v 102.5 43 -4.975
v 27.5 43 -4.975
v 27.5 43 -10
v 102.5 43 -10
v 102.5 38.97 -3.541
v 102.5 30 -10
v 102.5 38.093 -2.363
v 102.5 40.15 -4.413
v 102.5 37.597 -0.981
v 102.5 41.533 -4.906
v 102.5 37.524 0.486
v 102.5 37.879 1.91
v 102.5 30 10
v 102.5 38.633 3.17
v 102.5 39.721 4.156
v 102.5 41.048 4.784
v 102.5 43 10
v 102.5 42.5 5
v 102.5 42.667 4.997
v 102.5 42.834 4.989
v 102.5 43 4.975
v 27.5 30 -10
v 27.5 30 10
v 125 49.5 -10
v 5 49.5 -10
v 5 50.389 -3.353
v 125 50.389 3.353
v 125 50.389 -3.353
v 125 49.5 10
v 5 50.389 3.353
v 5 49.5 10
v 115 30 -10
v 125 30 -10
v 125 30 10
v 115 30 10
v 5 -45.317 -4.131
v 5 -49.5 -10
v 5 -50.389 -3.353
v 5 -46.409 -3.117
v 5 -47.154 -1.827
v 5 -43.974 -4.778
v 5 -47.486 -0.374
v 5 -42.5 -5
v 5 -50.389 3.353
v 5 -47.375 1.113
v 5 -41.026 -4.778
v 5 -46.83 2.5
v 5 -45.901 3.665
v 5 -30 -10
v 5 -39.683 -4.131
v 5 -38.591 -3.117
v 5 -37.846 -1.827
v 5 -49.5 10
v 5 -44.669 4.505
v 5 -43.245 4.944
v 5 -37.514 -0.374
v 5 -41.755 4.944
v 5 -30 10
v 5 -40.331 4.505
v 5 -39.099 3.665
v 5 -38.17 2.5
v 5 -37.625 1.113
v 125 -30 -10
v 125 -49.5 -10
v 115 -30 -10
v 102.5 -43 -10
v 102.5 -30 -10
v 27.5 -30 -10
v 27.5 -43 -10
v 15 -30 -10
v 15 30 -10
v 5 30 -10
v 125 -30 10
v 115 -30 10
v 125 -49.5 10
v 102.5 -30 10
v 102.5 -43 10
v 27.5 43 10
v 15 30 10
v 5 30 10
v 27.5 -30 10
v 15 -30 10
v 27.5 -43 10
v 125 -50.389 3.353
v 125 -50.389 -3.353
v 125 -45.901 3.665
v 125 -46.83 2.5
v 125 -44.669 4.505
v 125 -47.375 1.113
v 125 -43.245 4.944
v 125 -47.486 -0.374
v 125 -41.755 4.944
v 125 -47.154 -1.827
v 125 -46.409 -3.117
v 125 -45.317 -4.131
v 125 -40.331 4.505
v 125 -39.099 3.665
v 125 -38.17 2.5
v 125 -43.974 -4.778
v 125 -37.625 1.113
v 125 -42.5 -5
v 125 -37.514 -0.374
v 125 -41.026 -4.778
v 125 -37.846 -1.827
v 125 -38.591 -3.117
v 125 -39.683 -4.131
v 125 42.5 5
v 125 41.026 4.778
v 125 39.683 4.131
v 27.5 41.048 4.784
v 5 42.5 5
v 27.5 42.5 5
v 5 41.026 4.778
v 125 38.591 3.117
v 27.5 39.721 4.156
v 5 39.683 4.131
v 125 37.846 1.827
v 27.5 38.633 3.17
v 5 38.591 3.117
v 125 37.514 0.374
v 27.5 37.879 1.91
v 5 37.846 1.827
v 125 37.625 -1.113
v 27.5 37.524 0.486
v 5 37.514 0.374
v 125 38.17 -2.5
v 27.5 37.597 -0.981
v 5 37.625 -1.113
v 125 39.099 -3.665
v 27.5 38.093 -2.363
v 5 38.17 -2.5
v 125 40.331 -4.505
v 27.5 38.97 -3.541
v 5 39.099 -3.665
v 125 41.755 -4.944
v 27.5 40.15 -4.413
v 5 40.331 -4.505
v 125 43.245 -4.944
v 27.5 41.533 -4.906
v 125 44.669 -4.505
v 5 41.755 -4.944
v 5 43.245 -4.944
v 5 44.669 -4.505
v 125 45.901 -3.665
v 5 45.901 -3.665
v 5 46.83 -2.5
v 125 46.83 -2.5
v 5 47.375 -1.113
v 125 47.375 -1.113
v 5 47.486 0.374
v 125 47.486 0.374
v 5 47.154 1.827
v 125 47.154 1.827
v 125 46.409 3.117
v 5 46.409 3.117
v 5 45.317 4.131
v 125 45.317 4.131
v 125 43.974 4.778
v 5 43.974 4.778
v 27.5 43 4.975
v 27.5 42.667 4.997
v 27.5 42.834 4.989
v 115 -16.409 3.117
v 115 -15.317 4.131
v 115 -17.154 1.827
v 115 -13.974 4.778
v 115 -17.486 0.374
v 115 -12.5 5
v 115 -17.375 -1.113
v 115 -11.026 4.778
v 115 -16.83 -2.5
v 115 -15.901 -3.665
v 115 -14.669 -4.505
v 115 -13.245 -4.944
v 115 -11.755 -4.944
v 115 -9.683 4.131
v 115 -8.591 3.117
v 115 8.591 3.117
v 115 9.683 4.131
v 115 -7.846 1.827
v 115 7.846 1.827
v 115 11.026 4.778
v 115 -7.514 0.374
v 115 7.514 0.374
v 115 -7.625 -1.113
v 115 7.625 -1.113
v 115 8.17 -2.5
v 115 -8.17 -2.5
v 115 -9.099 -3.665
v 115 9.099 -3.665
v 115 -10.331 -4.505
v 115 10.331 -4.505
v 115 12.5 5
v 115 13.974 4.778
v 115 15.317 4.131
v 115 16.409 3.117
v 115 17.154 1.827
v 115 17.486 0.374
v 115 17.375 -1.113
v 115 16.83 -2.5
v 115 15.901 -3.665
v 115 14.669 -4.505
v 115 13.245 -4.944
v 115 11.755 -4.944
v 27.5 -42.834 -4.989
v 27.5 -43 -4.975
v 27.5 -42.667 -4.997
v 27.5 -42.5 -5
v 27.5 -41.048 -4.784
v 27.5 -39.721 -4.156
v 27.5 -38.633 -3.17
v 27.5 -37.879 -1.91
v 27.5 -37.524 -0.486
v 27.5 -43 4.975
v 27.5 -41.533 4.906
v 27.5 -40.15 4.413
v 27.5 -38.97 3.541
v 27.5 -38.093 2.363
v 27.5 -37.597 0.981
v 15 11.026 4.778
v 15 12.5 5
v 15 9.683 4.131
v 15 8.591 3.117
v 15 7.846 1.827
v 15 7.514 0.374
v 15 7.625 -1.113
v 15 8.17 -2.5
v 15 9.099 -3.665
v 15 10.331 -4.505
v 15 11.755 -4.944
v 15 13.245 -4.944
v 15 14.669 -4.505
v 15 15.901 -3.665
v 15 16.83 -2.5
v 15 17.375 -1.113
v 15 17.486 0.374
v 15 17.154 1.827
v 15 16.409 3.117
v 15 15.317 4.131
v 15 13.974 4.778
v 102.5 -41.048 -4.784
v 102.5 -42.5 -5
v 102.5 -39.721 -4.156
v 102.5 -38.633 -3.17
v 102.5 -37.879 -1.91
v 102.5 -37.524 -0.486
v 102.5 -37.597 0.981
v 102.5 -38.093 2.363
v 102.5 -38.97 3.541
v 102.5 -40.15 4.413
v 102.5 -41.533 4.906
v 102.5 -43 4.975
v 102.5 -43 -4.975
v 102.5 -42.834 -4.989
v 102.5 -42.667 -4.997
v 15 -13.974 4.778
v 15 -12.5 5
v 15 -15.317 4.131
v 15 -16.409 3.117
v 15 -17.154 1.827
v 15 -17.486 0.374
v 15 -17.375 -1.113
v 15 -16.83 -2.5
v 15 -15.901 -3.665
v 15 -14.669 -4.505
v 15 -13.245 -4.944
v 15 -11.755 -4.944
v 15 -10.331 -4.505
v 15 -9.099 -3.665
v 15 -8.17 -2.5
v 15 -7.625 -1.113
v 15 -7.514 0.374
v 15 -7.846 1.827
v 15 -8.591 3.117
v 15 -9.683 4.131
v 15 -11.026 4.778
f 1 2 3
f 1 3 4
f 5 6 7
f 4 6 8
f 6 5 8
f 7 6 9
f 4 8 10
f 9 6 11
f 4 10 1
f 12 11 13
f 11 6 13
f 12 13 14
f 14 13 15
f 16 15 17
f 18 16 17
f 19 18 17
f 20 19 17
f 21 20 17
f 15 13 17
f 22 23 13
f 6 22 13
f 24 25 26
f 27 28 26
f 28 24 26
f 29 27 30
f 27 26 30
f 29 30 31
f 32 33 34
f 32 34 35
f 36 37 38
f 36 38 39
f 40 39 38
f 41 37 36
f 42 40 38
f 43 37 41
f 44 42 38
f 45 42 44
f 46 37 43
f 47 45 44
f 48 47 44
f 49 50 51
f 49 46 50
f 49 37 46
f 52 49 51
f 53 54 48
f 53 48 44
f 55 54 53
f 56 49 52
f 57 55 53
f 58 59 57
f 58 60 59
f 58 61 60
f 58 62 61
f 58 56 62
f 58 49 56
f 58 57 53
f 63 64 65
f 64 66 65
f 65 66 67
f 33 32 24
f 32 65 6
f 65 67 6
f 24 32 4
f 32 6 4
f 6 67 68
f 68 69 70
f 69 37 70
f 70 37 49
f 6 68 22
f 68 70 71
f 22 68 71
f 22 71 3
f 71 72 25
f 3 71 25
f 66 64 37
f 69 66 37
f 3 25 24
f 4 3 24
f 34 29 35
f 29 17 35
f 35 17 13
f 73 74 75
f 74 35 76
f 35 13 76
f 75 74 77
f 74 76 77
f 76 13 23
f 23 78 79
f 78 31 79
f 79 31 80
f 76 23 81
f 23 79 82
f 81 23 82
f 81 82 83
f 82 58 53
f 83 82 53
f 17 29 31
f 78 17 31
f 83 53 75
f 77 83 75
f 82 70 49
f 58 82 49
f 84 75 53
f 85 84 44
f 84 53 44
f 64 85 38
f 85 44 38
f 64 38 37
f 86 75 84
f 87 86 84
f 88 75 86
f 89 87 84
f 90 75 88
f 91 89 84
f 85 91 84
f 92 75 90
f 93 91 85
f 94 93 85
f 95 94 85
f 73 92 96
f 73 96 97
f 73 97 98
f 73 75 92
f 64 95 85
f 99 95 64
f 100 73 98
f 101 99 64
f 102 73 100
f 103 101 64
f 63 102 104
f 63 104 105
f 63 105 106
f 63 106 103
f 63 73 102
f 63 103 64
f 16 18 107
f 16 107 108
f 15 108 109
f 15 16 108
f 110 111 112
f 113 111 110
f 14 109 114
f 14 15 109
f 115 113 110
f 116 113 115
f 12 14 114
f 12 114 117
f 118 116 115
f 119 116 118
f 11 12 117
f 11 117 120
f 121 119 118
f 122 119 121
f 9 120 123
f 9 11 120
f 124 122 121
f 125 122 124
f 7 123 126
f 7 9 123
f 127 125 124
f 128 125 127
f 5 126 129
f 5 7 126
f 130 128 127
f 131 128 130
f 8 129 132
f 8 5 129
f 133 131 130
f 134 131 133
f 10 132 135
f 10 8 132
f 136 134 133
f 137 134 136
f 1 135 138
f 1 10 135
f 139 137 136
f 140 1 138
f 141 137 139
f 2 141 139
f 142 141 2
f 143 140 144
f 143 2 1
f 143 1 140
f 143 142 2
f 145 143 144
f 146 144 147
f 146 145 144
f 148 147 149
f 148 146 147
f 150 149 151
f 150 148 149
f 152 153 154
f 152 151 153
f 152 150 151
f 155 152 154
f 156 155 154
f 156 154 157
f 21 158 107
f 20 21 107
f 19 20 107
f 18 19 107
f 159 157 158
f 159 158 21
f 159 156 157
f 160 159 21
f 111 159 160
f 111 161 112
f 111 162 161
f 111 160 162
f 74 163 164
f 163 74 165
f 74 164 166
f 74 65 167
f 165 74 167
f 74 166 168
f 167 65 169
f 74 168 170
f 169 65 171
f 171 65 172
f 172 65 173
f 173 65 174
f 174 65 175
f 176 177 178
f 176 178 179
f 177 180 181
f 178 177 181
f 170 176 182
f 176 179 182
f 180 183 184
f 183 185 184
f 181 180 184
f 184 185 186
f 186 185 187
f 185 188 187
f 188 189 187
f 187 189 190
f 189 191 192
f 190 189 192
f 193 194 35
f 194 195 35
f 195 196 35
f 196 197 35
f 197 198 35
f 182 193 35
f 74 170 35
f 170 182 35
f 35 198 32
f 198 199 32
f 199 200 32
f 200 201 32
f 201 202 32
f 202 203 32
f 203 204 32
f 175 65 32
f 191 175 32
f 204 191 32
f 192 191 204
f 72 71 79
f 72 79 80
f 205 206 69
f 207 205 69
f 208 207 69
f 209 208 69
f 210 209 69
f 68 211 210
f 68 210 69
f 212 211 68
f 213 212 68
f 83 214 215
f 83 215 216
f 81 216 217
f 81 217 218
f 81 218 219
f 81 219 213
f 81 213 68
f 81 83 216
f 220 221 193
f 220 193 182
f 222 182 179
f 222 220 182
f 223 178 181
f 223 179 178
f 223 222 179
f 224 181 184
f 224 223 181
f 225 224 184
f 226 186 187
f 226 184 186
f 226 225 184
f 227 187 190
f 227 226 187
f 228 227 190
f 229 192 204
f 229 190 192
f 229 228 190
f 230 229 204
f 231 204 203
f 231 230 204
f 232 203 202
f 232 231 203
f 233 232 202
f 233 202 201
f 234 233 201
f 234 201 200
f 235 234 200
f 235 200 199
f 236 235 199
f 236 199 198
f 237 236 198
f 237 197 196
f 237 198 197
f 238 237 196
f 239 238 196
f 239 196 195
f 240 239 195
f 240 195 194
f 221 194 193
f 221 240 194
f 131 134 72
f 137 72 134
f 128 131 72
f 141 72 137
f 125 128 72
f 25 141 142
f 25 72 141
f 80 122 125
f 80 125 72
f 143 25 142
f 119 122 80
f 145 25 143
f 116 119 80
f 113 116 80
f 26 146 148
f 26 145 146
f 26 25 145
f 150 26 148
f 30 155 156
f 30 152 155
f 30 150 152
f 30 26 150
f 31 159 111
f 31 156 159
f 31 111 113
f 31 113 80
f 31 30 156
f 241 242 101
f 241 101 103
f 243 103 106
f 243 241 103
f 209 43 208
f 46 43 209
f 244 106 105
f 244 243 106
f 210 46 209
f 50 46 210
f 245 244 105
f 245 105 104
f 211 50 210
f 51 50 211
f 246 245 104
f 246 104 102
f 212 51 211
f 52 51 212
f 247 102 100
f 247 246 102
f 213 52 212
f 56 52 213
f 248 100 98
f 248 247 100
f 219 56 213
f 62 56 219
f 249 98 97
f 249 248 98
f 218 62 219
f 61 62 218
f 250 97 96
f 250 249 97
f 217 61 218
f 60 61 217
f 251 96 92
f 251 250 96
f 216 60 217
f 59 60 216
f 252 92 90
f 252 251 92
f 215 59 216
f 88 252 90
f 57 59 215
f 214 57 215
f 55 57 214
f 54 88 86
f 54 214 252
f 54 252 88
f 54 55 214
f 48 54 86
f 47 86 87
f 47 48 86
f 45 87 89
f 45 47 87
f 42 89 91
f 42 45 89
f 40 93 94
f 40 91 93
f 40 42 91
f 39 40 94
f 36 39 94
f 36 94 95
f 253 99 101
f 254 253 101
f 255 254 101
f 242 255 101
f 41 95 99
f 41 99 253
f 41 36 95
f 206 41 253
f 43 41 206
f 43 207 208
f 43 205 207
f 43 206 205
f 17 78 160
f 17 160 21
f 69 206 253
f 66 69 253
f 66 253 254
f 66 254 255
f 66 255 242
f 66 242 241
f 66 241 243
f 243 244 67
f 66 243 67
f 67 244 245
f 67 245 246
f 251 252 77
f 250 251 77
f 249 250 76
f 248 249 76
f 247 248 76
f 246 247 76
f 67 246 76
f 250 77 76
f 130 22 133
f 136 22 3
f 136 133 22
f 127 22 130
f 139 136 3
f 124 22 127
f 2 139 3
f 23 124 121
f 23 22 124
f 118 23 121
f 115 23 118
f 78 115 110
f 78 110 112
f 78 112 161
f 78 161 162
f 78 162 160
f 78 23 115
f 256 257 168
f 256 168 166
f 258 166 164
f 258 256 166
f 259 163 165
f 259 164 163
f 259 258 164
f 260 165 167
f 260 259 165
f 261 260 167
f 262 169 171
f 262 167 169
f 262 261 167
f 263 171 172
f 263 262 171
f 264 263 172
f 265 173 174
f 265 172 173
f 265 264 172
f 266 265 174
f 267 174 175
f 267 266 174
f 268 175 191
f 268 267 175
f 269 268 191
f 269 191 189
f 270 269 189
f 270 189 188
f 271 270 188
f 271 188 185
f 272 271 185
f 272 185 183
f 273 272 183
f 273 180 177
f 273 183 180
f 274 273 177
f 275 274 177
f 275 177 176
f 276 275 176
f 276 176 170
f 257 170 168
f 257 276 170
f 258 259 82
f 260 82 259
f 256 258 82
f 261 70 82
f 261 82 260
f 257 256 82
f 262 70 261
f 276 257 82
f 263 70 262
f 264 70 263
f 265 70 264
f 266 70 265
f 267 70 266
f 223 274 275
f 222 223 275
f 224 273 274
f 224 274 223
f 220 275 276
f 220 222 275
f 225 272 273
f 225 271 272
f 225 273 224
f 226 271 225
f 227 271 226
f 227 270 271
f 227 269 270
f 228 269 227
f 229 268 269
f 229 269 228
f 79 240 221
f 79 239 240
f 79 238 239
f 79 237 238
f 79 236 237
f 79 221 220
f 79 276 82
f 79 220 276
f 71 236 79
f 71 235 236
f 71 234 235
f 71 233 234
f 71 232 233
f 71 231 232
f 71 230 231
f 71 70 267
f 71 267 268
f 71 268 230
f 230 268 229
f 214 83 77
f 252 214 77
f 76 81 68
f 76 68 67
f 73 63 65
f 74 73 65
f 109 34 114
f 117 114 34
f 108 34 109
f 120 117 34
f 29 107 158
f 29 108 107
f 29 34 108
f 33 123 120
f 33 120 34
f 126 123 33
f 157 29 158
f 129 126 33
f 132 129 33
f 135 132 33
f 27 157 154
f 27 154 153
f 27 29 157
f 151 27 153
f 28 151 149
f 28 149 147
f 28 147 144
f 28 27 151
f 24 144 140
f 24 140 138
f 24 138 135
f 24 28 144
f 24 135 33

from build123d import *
from OCP.BRepFilletAPI import BRepFilletAPI_MakeChamfer

# Parameters (mm, degrees)
BOSS_EXTRUDE1_DEPTH = 125
SKETCH2_R           = 50.5
BOSS_EXTRUDE2_DEPTH = 5
SKETCH3_W           = 10
SKETCH3_H           = 60
CUT_EXTRUDE1_DEPTH  = 148.76839987
SKETCH7_W           = 62
SKETCH7_H           = 52
CUT_EXTRUDE3_DEPTH  = 5
SKETCH8_R           = 50.5
SKETCH8_W           = 62
SKETCH8_H           = 69
BOSS_EXTRUDE4_DEPTH = 140
CUT_EXTRUDE14_REACH = 159.164
SKETCH22_W          = 10
SKETCH22_H          = 25
BOSS_EXTRUDE5_DEPTH = 125
SKETCH11_W          = 140
SKETCH11_H          = 60
CUT_EXTRUDE5_DEPTH  = 397.485182573
CHAMFER2_SIZE       = 5
CHAMFER2_SIZE2      = 1.819851171
SKETCH9_R           = 5
CUT_EXTRUDE4_DEPTH  = 397.485182573
CUT_EXTRUDE6_REACH  = 399.883
SKETCH12_W          = 10
SKETCH12_H          = 60
SKETCH14_R          = 5
CUT_EXTRUDE8_DEPTH  = 397.485182573
SKETCH15_W          = 75
SKETCH15_H          = 13
CUT_EXTRUDE9_DEPTH  = 398.88252035
SKETCH17_R          = 50.5
SKETCH17_R_2        = 5
BOSS_EXTRUDE6_DEPTH = 5
CUT_EXTRUDE11_REACH = 403.404
SKETCH18_W          = 48
SKETCH18_H          = 35
SKETCH19_W          = 20
SKETCH19_H          = 20
BOSS_EXTRUDE7_DEPTH = 26
SKETCH20_W          = 23.5
SKETCH20_H          = 12.5
CUT_EXTRUDE12_DEPTH = 16
CHAMFER1_SIZE       = 4
SKETCH24_R          = 6
CUT_EXTRUDE16_DEPTH = 5
CUT_EXTRUDE13_REACH = 402.912
SKETCH21_W          = 7
SKETCH21_H          = 7
CUT_EXTRUDE15_REACH = 432.687
SKETCH23_W          = 1.5
SKETCH23_H          = 5
SKETCH16_W          = 221.910412248
SKETCH16_H          = 202.335986628
CUT_EXTRUDE10_DEPTH = 296
SKETCH25_W          = 135.205067632
SKETCH25_H          = 113.328081158
CUT_EXTRUDE17_DEPTH = 5


with BuildPart() as part:
    # Sketch1 → Boss-Extrude1 (new body)
    with BuildSketch(Plane(origin=(0, 0, 0), x_dir=(0, 0, -1), z_dir=(1, 0, 0))):
        with BuildLine():
            Line((-10, 49.5), (-10, -49.5))
            ThreePointArc((-10, -49.5), (0, -50.5), (10, -49.5))
            Line((10, -49.5), (10, 49.5))
            ThreePointArc((10, 49.5), (0, 50.5), (-10, 49.5))
        make_face()
    extrude(amount=BOSS_EXTRUDE1_DEPTH)

    # Sketch2 → Boss-Extrude2 (add)
    with BuildSketch(Plane(origin=(0, 0, 0), x_dir=(0, 0, -1), z_dir=(1, 0, 0))):
        with Locations(Location((0, 0, 0), (0, 0, 101.421186275))):
            Circle(SKETCH2_R)
    extrude(amount=BOSS_EXTRUDE2_DEPTH)

    # Sketch3 → Cut-Extrude1 (cut, through all)
    with BuildSketch(Plane(origin=(0, 0, -10), x_dir=(-1, 0, 0), z_dir=(0, 0, -1))):
        with Locations((-10, 0)):
            Rectangle(SKETCH3_W, SKETCH3_H)
        with Locations((-120, 0)):
            Rectangle(SKETCH3_W, SKETCH3_H)
    extrude(amount=-CUT_EXTRUDE1_DEPTH, mode=Mode.SUBTRACT)

    # Sketch7 → Cut-Extrude3 (cut)
    with BuildSketch(Plane.ZY):
        Rectangle(SKETCH7_W, SKETCH7_H)
    extrude(amount=-CUT_EXTRUDE3_DEPTH, mode=Mode.SUBTRACT)

    # Sketch8 → Boss-Extrude4 (add)
    with BuildSketch(Plane(origin=(125, 0, 0), x_dir=(0, 0, -1), z_dir=(1, 0, 0))):
        Circle(SKETCH8_R)
        with Locations((1.649655435, 0)):
            Rectangle(SKETCH8_W, SKETCH8_H, mode=Mode.SUBTRACT)
    extrude(amount=BOSS_EXTRUDE4_DEPTH)

    # Sketch22 → Cut-Extrude14 (cut, up to next)
    with BuildSketch(Plane.ZY.offset(-125), mode=Mode.PRIVATE) as cut_extrude14_sk1:
        with Locations((-45.5, 0)):
            Rectangle(SKETCH22_W, SKETCH22_H)
    cut_extrude14_tool1 = extrude(cut_extrude14_sk1.sketch, amount=-CUT_EXTRUDE14_REACH, mode=Mode.PRIVATE) & part.part
    add(cut_extrude14_tool1.solids().sort_by_distance((125, 0, -45.5))[0], mode=Mode.SUBTRACT)

    # Sketch10 → Boss-Extrude5 (add)
    with BuildSketch(Plane(origin=(265, 0, 0), x_dir=(0, 0, -1), z_dir=(1, 0, 0))):
        with BuildLine():
            Line((-10, 49.5), (-10, -49.5))
            ThreePointArc((-10, -49.5), (0, -50.5), (10, -49.5))
            Line((10, -49.5), (10, 49.5))
            ThreePointArc((10, 49.5), (0, 50.5), (-10, 49.5))
        make_face()
    extrude(amount=BOSS_EXTRUDE5_DEPTH)

    # Sketch11 → Cut-Extrude5 (cut, through all)
    with BuildSketch(Plane.XY):
        with Locations((195, 0)):
            Rectangle(SKETCH11_W, SKETCH11_H)
    extrude(amount=CUT_EXTRUDE5_DEPTH, mode=Mode.SUBTRACT)

    # Chamfer2: one chamfer whose edges measure the first distance from different faces: ONE call of the kernel's chamfer builder (chamfer() names one face for all edges)
    chamfer2_edges_1 = [part.edges().sort_by_distance(p)[0] for p in [
        (195, 30, 29.350344565),
    ]]
    chamfer2_side_1 = [part.faces().sort_by_distance(p)[0] for p in [
        (195, 30, 34.98680688),
    ]]
    chamfer2_edges_2 = [part.edges().sort_by_distance(p)[0] for p in [
        (195, -30, 29.350344565),
    ]]
    chamfer2_side_2 = [part.faces().sort_by_distance(p)[0] for p in [
        (195, -30, 34.98680688),
    ]]
    chamfer2 = BRepFilletAPI_MakeChamfer(part.part.solid().wrapped)
    for e in chamfer2_edges_1:
        chamfer2.Add(CHAMFER2_SIZE, CHAMFER2_SIZE2, e.wrapped, chamfer2_side_1[0].wrapped)  # the first distance lies on this face
    for e in chamfer2_edges_2:
        chamfer2.Add(CHAMFER2_SIZE, CHAMFER2_SIZE2, e.wrapped, chamfer2_side_2[0].wrapped)  # the first distance lies on this face
    add(Compound.cast(chamfer2.Shape()), mode=Mode.REPLACE)

    # Sketch9 → Cut-Extrude4 (cut, through all)
    with BuildSketch(Plane(origin=(0, 0, 0), x_dir=(0, 0, -1), z_dir=(1, 0, 0))):
        with Locations((0, -42.5)):
            Circle(SKETCH9_R)
        with Locations(Location((0, 42.5, 0), (0, 0, 180))):
            Circle(SKETCH9_R)
    extrude(amount=CUT_EXTRUDE4_DEPTH, mode=Mode.SUBTRACT)

    # Sketch12 → Cut-Extrude6 (cut, up to next)
    with BuildSketch(Plane(origin=(0, 0, -10), x_dir=(-1, 0, 0), z_dir=(0, 0, -1)), mode=Mode.PRIVATE) as cut_extrude6_sk1:
        with Locations((-270, 0)):
            Rectangle(SKETCH12_W, SKETCH12_H)
    cut_extrude6_tool1 = extrude(cut_extrude6_sk1.sketch, amount=-CUT_EXTRUDE6_REACH, mode=Mode.PRIVATE) & part.part
    # Sketch12 → Cut-Extrude6 (cut, up to next)
    with BuildSketch(Plane(origin=(0, 0, -10), x_dir=(-1, 0, 0), z_dir=(0, 0, -1)), mode=Mode.PRIVATE) as cut_extrude6_sk2:
        with Locations((-385, 0)):
            Rectangle(SKETCH12_W, SKETCH12_H)
    cut_extrude6_tool2 = extrude(cut_extrude6_sk2.sketch, amount=-CUT_EXTRUDE6_REACH, mode=Mode.PRIVATE) & part.part
    add(cut_extrude6_tool1.solids().sort_by_distance((270, 0, -10))[0], mode=Mode.SUBTRACT)
    add(cut_extrude6_tool2.solids().sort_by_distance((385, 0, -10))[0], mode=Mode.SUBTRACT)

    # Sketch14 → Cut-Extrude8 (cut, through all)
    with BuildSketch(Plane(origin=(0, 0, 0), x_dir=(0, 0, -1), z_dir=(1, 0, 0))):
        with Locations(Location((0, 12.5, 0), (0, 0, 180))):
            Circle(SKETCH14_R)
        with Locations(Location((0, -12.5, 0), (0, 0, 180))):
            Circle(SKETCH14_R)
    extrude(amount=CUT_EXTRUDE8_DEPTH, mode=Mode.SUBTRACT)

    # Sketch15 → Cut-Extrude9 (cut, through all)
    with BuildSketch(Plane.XY.offset(10)):
        with Locations((65, 36.5)):
            Rectangle(SKETCH15_W, SKETCH15_H)
        with Locations((65, -36.5)):
            Rectangle(SKETCH15_W, SKETCH15_H)
    extrude(amount=-CUT_EXTRUDE9_DEPTH, mode=Mode.SUBTRACT)

    # Sketch17 → Boss-Extrude6 (add)
    with BuildSketch(Plane(origin=(390, 0, 0), x_dir=(0, 0, -1), z_dir=(1, 0, 0))):
        Circle(SKETCH17_R)
        with Locations(Location((0, 42.5, 0), (0, 0, 180))):
            Circle(SKETCH17_R_2, mode=Mode.SUBTRACT)
        with Locations((0, -42.5)):
            Circle(SKETCH17_R_2, mode=Mode.SUBTRACT)
    extrude(amount=BOSS_EXTRUDE6_DEPTH)

    # Sketch18 → Cut-Extrude11 (cut, up to next)
    with BuildSketch(Plane(origin=(395, 0, 0), x_dir=(0, 0, -1), z_dir=(1, 0, 0)), mode=Mode.PRIVATE) as cut_extrude11_sk1:
        with Locations((-1, 0)):
            Rectangle(SKETCH18_W, SKETCH18_H)
    cut_extrude11_tool1 = extrude(cut_extrude11_sk1.sketch, amount=-CUT_EXTRUDE11_REACH, mode=Mode.PRIVATE) & part.part
    add(cut_extrude11_tool1.solids().sort_by_distance((395, 0, 1))[0], mode=Mode.SUBTRACT)

    # Sketch19 → Boss-Extrude7 (add)
    with BuildSketch(Plane(origin=(395, 0, 0), x_dir=(0, 0, -1), z_dir=(1, 0, 0))):
        with Locations((-35, 0)):
            Rectangle(SKETCH19_W, SKETCH19_H)
    extrude(amount=BOSS_EXTRUDE7_DEPTH)

    # Sketch20 → Cut-Extrude12 (cut)
    with BuildSketch(Plane(origin=(0, 0, 25), x_dir=(-1, 0, 0), z_dir=(0, 0, -1))):
        with Locations((-406.25, 0)):
            Rectangle(SKETCH20_W, SKETCH20_H)
    extrude(amount=-CUT_EXTRUDE12_DEPTH, mode=Mode.SUBTRACT)

    # Chamfer1
    # the kernel refuses this chamfer: 4 mm, written as the material it adds along each edge
    with BuildSketch(Plane(origin=(395, -10, 45), x_dir=(-0.0274958766105822, 0, 0.999621916911297), z_dir=(0, 1, 0)), Plane(origin=(395, -10, 25), x_dir=(-0.02749587661058217, -0.9996219169112968, 0), z_dir=(0, 0, 1)), Plane(origin=(395, 10, 45), x_dir=(-0.02749587661058217, 0.9996219169112968, 0), z_dir=(0, 0, -1))) as chamfer1_piece_1:
        Polygon((CHAMFER1_SIZE * 0.999621916911, CHAMFER1_SIZE * 0.0274958766106), (-CHAMFER1_SIZE * 0.0274958766106, CHAMFER1_SIZE * 0.999621916911), (0, 0), align=None)
    extrude(amount=20)
    with BuildSketch(Plane(origin=(395, -20.286731952, 45), x_dir=(-0.0274958766105822, 0, 0.999621916911297), z_dir=(0, 1, 0))) as chamfer1_piece_2a_section:
        Polygon((CHAMFER1_SIZE * 0.999621916911, CHAMFER1_SIZE * 0.0274958766106), (-CHAMFER1_SIZE * 0.0274958766106, CHAMFER1_SIZE * 0.999621916911), (0, 0), align=None)
    chamfer1_piece_2a = extrude(amount=30.286731952, mode=Mode.PRIVATE)
    chamfer1_piece_2a = chamfer1_piece_2a & Plane(origin=(396.415521785, 0, 0), x_dir=(0, 0.98019801980198, -0.19801980198019895), z_dir=(-1, 0, 0)) * Cylinder(50.5, 77, mode=Mode.PRIVATE)
    chamfer1_piece_2a = split(chamfer1_piece_2a, bisect_by=Plane(origin=(396.415521785, -10, 46.13532123), z_dir=(0, -1, 0)), keep=Keep.TOP, mode=Mode.PRIVATE)
    with BuildSketch(Plane(origin=(395, -10, 25), x_dir=(-0.02749587661058217, -0.9996219169112968, 0), z_dir=(0, 0, 1))) as chamfer1_piece_2b_section:
        Polygon((CHAMFER1_SIZE * 0.999621916911, CHAMFER1_SIZE * 0.0274958766106), (-CHAMFER1_SIZE * 0.0274958766106, CHAMFER1_SIZE * 0.999621916911), (0, 0), align=None)
    chamfer1_piece_2b = extrude(amount=30.286731952, mode=Mode.PRIVATE)
    chamfer1_piece_2b = chamfer1_piece_2b & Plane(origin=(396.349637844, 0, 0), x_dir=(0, 0.98019801980198, -0.19801980198019895), z_dir=(-1, 0, 0)) * Cylinder(50.5, 77, mode=Mode.PRIVATE)
    chamfer1_piece_2b = split(chamfer1_piece_2b, bisect_by=Plane(origin=(396.349637844, -11.262058297, 45), z_dir=(0, 0, 1)), keep=Keep.TOP, mode=Mode.PRIVATE)
    chamfer1_piece_2 = chamfer1_piece_2a & chamfer1_piece_2b
    add(chamfer1_piece_2)
    with BuildSketch(Plane(origin=(395, 10, 55.286731952), x_dir=(-0.02749587661058217, 0.9996219169112968, 0), z_dir=(0, 0, -1))) as chamfer1_piece_3a_section:
        Polygon((CHAMFER1_SIZE * 0.999621916911, CHAMFER1_SIZE * 0.0274958766106), (-CHAMFER1_SIZE * 0.0274958766106, CHAMFER1_SIZE * 0.999621916911), (0, 0), align=None)
    chamfer1_piece_3a = extrude(amount=30.286731952, mode=Mode.PRIVATE)
    chamfer1_piece_3a = chamfer1_piece_3a & Plane(origin=(396.349637844, 0, 0), x_dir=(0, 0.98019801980198, -0.19801980198019895), z_dir=(-1, 0, 0)) * Cylinder(50.5, 77, mode=Mode.PRIVATE)
    chamfer1_piece_3a = split(chamfer1_piece_3a, bisect_by=Plane(origin=(396.349637844, 11.262058297, 45), z_dir=(0, 0, 1)), keep=Keep.TOP, mode=Mode.PRIVATE)
    with BuildSketch(Plane(origin=(395, -10, 45), x_dir=(-0.0274958766105822, 0, 0.999621916911297), z_dir=(0, 1, 0))) as chamfer1_piece_3b_section:
        Polygon((CHAMFER1_SIZE * 0.999621916911, CHAMFER1_SIZE * 0.0274958766106), (-CHAMFER1_SIZE * 0.0274958766106, CHAMFER1_SIZE * 0.999621916911), (0, 0), align=None)
    chamfer1_piece_3b = extrude(amount=30.286731952, mode=Mode.PRIVATE)
    chamfer1_piece_3b = chamfer1_piece_3b & Plane(origin=(396.415521777, 0, 0), x_dir=(0, 0.98019801980198, -0.19801980198019895), z_dir=(-1, 0, 0)) * Cylinder(50.5, 77, mode=Mode.PRIVATE)
    chamfer1_piece_3b = split(chamfer1_piece_3b, bisect_by=Plane(origin=(396.415521777, 10, 46.135321233), z_dir=(0, 1, 0)), keep=Keep.TOP, mode=Mode.PRIVATE)
    chamfer1_piece_3 = chamfer1_piece_3a & chamfer1_piece_3b
    add(chamfer1_piece_3)
    # the kernel refuses this chamfer: 4 mm, written as the material it takes off along each edge
    with BuildSketch(Plane(origin=(421, -20.286731952, 45), x_dir=(0.0274958766105822, 0, -0.999621916911297), z_dir=(0, 1, 0)), Plane(origin=(421, 10, 55.286731952), x_dir=(0.027495876610582174, -0.9996219169112968, 0), z_dir=(0, 0, -1))) as chamfer1_2_piece_1:
        Polygon((CHAMFER1_SIZE * 0.999621916911, CHAMFER1_SIZE * 0.0274958766106), (-CHAMFER1_SIZE * 0.0274958766106, CHAMFER1_SIZE * 0.999621916911), (0, 0), align=None)
    extrude(amount=40.573463904, mode=Mode.SUBTRACT)
    with BuildSketch(Plane(origin=(421, -10, 14.713268048), x_dir=(-0.9996219169112968, -0.027495876610586605, 0), z_dir=(0, 0, 1))) as chamfer1_2_piece_2:
        Polygon((CHAMFER1_SIZE * 0.999621916911, -CHAMFER1_SIZE * 0.0274958766106), (-CHAMFER1_SIZE * 0.0274958766106, -CHAMFER1_SIZE * 0.999621916911), (0, 0), align=None)
    extrude(amount=40.573463904, mode=Mode.SUBTRACT)

    # Sketch24 → Cut-Extrude16 (cut)
    with BuildSketch(Plane.ZY):
        with Locations((-17, 37)):
            Circle(SKETCH24_R)
        with Locations(Location((17, 37, 0), (0, 0, 180))):
            Circle(SKETCH24_R)
        with Locations((17, -37)):
            Circle(SKETCH24_R)
        with Locations(Location((-17, -37, 0), (0, 0, 180))):
            Circle(SKETCH24_R)
    extrude(amount=-CUT_EXTRUDE16_DEPTH, mode=Mode.SUBTRACT)

    # Sketch21 → Cut-Extrude13 (cut, up to next)
    with BuildSketch(Plane(origin=(394.5, 0, 0), x_dir=(0, 0, -1), z_dir=(1, 0, 0)), mode=Mode.PRIVATE) as cut_extrude13_sk1:
        with Locations((-35.5, 0)):
            Rectangle(SKETCH21_W, SKETCH21_H)
    cut_extrude13_tool1 = extrude(cut_extrude13_sk1.sketch, amount=-CUT_EXTRUDE13_REACH, mode=Mode.PRIVATE) & part.part
    add(cut_extrude13_tool1.solids().sort_by_distance((394.5, 0, 35.5))[0], mode=Mode.SUBTRACT)

    # Sketch23 → Cut-Extrude15 (cut, up to next)
    with BuildSketch(Plane(origin=(0, 0, 25), x_dir=(-1, 0, 0), z_dir=(0, 0, -1)), mode=Mode.PRIVATE) as cut_extrude15_sk1:
        with Locations((-393.75, 0)):
            Rectangle(SKETCH23_W, SKETCH23_H)
    cut_extrude15_tool1 = extrude(cut_extrude15_sk1.sketch, amount=-CUT_EXTRUDE15_REACH, mode=Mode.PRIVATE) & part.part
    add(cut_extrude15_tool1.solids().sort_by_distance((393.75, 0, 25))[0], mode=Mode.SUBTRACT)

    # Sketch16 → Cut-Extrude10 (cut)
    with BuildSketch(Plane(origin=(421, 0, 0), x_dir=(0, 0, -1), z_dir=(1, 0, 0))):
        with Locations((18.111140578, -10.36995741)):
            Rectangle(SKETCH16_W, SKETCH16_H)
    extrude(amount=-CUT_EXTRUDE10_DEPTH, mode=Mode.SUBTRACT)

    # Sketch25 → Cut-Extrude17 (cut)
    with BuildSketch(Plane.ZY):
        Rectangle(SKETCH25_W, SKETCH25_H)
    extrude(amount=-CUT_EXTRUDE17_DEPTH, mode=Mode.SUBTRACT)


solid = part.part
